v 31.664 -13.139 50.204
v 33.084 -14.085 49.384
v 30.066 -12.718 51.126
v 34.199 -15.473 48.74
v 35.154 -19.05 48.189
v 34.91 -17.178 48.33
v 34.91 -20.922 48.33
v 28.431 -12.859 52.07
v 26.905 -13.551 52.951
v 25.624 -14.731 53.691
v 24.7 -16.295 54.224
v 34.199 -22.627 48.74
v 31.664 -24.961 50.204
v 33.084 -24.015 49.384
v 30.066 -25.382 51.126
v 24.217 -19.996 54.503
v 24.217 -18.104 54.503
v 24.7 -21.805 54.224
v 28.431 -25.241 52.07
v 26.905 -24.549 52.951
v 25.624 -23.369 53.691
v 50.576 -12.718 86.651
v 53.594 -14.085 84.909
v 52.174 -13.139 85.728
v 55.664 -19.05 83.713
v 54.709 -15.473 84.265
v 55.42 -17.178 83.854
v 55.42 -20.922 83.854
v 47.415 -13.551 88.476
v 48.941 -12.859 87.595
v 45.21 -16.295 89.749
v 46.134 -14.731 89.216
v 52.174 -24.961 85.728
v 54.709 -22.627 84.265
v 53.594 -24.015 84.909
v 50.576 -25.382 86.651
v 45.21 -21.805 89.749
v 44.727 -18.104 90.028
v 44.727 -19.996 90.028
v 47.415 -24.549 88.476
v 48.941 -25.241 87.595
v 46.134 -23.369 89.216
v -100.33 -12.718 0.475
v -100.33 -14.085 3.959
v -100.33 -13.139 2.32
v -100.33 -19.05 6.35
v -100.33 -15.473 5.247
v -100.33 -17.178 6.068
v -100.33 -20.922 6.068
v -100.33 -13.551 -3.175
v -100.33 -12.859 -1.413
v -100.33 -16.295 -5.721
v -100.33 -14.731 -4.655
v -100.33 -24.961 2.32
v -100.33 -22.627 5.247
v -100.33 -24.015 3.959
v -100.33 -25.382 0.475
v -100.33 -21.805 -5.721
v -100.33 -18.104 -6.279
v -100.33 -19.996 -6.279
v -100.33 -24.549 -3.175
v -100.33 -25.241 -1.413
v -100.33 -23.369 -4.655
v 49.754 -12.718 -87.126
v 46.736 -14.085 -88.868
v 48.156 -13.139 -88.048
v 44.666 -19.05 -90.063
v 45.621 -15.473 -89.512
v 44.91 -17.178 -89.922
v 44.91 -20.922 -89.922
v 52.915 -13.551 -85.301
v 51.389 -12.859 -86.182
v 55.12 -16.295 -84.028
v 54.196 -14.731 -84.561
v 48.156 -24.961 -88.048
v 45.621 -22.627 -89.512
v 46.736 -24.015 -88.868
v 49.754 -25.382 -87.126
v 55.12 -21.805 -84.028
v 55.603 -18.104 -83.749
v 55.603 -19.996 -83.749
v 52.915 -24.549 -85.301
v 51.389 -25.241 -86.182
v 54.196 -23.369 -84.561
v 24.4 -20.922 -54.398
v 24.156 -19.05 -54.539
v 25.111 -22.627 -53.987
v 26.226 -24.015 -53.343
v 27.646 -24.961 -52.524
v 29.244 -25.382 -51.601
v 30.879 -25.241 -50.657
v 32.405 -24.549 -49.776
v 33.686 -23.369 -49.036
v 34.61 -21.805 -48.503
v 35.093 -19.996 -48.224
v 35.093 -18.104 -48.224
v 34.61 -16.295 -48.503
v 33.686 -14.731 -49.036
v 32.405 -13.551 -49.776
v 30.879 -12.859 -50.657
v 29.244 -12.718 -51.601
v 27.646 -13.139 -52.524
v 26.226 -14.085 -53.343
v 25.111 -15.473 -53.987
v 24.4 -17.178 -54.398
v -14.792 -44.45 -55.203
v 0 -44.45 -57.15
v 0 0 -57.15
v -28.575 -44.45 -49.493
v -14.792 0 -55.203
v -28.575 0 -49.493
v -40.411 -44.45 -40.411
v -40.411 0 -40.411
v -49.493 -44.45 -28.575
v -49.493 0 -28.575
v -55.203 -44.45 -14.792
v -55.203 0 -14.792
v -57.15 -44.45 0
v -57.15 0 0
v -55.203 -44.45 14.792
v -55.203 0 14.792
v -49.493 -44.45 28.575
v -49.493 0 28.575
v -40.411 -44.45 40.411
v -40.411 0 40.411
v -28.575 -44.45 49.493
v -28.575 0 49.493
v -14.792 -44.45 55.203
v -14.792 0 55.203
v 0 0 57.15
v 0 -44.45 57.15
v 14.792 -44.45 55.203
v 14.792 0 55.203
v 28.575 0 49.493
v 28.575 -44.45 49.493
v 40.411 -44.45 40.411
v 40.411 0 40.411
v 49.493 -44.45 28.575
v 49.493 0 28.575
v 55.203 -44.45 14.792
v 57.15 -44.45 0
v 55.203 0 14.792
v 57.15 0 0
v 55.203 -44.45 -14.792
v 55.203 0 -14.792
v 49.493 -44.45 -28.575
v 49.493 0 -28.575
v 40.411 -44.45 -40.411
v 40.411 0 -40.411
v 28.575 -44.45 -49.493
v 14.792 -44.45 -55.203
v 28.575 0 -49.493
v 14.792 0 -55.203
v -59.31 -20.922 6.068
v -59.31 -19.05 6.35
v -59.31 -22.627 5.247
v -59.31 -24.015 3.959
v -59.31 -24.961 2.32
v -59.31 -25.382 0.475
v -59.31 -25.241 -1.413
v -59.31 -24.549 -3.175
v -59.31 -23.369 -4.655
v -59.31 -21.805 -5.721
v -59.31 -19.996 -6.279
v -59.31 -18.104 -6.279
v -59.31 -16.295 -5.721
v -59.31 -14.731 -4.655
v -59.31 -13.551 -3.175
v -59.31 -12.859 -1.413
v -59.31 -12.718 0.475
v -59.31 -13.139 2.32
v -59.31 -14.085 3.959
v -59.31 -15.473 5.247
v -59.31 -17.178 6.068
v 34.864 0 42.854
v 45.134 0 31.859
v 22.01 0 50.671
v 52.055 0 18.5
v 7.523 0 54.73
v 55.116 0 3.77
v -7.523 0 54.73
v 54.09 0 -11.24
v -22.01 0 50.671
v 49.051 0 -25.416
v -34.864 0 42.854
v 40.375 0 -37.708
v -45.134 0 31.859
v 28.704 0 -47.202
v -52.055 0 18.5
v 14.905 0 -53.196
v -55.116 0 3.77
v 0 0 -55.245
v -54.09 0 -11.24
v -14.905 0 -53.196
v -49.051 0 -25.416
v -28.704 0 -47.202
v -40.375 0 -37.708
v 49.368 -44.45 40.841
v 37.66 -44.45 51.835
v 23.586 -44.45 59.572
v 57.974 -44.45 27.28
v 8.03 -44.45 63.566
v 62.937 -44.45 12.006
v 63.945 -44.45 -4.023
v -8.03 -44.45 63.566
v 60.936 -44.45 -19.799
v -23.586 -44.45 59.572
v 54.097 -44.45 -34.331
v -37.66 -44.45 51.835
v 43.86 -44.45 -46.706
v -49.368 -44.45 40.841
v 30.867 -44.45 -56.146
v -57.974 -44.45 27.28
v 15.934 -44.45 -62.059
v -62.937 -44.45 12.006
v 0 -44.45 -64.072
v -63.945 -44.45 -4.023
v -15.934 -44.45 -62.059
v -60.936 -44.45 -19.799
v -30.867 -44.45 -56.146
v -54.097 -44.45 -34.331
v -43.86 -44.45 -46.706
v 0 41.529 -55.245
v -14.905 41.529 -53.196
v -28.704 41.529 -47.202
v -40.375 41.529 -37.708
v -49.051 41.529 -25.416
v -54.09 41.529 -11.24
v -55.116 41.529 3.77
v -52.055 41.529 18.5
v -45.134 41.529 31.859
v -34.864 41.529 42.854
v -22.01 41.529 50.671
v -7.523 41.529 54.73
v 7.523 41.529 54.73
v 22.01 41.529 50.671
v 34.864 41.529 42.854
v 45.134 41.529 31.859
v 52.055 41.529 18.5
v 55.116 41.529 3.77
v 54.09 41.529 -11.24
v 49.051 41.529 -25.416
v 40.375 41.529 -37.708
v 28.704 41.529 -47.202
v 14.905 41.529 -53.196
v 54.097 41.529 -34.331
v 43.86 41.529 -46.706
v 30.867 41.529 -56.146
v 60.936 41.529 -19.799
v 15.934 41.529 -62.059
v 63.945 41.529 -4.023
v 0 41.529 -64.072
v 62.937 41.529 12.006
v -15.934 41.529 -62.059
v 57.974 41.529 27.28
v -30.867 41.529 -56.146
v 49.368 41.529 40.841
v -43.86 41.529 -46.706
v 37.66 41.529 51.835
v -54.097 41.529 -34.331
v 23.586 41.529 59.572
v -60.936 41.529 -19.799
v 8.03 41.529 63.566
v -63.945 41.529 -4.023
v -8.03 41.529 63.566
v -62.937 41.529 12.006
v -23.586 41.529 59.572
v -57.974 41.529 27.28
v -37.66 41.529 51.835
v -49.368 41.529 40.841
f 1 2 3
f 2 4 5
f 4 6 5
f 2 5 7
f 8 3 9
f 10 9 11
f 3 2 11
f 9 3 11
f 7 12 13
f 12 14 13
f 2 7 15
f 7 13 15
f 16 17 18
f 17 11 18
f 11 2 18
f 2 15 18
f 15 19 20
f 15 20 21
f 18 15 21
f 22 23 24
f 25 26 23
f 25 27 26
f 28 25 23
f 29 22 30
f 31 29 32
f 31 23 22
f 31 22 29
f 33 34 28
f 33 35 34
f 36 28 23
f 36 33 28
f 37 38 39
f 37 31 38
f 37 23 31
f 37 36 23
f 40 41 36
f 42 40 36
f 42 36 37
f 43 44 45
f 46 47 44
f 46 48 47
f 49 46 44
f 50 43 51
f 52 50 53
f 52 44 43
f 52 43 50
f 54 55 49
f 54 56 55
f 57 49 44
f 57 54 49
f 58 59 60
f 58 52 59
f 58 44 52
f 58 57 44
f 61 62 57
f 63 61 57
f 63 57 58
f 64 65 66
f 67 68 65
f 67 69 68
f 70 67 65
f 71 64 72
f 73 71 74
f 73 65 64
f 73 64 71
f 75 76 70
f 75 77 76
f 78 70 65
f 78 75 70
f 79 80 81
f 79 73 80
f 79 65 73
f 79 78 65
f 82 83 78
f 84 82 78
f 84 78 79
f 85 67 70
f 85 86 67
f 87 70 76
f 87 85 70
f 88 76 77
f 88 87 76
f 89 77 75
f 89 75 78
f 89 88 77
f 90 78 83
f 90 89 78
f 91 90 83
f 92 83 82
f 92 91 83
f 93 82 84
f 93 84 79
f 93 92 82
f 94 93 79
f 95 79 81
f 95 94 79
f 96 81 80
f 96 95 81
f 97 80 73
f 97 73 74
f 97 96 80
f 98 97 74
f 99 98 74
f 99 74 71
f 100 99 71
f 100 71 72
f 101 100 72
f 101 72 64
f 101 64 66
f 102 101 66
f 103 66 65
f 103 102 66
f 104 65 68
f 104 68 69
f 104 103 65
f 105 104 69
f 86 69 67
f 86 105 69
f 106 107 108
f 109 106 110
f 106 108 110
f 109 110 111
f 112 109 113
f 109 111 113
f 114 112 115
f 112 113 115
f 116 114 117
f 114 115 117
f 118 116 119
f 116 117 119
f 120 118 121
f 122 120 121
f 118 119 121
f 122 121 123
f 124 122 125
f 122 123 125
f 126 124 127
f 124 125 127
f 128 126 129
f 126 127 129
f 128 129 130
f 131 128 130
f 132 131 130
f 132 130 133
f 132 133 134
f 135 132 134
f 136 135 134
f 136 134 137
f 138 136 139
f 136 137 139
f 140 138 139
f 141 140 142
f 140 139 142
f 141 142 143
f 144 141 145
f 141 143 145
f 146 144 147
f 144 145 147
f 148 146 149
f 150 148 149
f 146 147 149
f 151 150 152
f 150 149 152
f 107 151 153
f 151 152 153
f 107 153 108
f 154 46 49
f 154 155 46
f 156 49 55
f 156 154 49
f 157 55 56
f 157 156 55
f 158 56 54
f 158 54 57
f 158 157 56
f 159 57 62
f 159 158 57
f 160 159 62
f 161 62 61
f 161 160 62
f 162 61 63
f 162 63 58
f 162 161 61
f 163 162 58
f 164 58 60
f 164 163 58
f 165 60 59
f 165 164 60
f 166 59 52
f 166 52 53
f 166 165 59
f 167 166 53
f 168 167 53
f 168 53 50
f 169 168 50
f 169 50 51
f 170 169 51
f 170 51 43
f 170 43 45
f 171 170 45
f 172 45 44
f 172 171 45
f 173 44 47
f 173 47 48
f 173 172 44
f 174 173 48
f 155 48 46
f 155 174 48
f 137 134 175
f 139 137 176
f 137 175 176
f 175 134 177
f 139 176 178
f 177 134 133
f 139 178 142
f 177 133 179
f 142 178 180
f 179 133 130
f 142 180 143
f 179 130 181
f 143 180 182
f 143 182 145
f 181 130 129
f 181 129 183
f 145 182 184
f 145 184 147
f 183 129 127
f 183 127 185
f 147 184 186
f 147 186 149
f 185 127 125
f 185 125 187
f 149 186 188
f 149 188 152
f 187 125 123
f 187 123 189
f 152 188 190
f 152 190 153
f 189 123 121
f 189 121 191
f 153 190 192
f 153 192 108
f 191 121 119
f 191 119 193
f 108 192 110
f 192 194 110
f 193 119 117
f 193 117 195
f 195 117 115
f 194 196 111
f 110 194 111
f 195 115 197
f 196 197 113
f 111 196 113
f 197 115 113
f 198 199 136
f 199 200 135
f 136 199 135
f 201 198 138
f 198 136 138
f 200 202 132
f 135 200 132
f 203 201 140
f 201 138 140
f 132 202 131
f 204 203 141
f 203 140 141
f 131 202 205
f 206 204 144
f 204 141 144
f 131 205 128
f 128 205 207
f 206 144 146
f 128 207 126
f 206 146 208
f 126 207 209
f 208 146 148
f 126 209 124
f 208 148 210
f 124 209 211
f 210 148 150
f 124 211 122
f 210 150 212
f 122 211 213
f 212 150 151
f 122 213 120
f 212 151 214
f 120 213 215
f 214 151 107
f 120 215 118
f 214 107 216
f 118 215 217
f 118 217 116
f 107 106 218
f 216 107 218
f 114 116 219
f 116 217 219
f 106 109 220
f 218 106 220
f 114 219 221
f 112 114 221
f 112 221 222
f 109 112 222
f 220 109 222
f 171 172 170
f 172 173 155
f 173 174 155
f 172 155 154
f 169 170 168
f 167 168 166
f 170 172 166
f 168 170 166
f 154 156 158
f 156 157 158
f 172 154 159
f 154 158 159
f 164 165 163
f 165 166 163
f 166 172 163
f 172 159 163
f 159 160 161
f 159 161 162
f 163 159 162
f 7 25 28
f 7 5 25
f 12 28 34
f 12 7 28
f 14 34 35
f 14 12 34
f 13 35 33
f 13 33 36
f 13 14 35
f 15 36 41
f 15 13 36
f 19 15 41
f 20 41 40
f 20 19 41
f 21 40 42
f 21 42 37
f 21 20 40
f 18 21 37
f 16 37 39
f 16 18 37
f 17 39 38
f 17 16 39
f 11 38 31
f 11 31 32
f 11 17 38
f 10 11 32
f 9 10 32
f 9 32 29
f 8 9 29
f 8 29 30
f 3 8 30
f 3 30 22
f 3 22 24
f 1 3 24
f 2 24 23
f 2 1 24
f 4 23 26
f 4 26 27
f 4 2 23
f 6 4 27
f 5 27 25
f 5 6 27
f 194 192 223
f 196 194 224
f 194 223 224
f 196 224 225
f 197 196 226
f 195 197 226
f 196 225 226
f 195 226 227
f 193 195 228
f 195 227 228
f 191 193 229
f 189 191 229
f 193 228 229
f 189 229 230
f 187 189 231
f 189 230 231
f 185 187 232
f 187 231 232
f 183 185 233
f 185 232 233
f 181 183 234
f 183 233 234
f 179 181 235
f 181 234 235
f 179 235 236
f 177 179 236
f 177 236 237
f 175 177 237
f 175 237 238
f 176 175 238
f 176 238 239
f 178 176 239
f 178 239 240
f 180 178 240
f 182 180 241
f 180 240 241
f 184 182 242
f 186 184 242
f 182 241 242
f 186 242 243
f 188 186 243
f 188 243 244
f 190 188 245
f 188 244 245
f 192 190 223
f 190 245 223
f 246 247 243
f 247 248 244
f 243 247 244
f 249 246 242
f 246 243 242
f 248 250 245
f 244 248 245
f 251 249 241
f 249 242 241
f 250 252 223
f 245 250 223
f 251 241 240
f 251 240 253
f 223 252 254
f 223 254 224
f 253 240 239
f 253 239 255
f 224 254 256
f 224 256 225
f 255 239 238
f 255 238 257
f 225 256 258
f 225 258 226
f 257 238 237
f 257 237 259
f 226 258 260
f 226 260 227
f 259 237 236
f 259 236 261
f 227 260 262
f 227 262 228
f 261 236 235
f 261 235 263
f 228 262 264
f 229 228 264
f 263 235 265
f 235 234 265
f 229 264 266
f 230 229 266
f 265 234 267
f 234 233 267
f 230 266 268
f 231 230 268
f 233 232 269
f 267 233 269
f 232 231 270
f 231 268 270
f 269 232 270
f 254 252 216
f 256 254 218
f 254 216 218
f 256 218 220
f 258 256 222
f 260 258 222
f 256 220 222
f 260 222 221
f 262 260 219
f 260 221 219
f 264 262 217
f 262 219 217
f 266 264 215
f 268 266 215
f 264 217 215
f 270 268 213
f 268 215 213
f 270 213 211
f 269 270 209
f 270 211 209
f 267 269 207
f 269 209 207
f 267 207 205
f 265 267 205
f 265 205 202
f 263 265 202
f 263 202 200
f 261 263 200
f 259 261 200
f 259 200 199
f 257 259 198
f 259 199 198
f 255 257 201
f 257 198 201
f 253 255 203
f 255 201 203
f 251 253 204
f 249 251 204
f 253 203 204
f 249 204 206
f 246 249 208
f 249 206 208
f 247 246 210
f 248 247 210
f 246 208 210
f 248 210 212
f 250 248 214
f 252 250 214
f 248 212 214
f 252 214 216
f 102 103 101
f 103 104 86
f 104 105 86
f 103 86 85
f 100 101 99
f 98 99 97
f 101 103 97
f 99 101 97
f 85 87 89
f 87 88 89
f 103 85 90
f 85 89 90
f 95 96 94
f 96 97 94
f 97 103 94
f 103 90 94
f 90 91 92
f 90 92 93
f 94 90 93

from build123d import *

# Parameters (mm, degrees)
SKETCH2_W         = 41.020252489
SKETCH2_H         = 6.35
CIRPATTERN1_COUNT = 3


with BuildPart() as part:
    # Sketch1 → Revolve1 (revolve)
    with BuildSketch(Plane.XY):
        Polygon((57.15, -44.45), (57.15, 0), (55.245, 0), (55.245, 41.529), (64.0715, 41.529), (64.0715, -44.45), align=None)
    revolve(axis=Axis((0, -1015.258156135, 0), (0, 1, 0)))


with BuildPart() as body_2:
    # Sketch2 → Revolve2 (revolve)
    with BuildSketch(Plane.XY):
        with Locations((-79.819873756, -15.875)):
            Rectangle(SKETCH2_W, SKETCH2_H)
    revolve(axis=Axis((-1132.04536123, -19.05, 0), (1, 0, 0)))


with BuildPart() as cirpattern1_1:
    # CirPattern1: pattern copy
    add(body_2.part.rotate(Axis((0, 45.82795, 0), (0, -1, 0)), 1 * 360 / CIRPATTERN1_COUNT))


with BuildPart() as cirpattern1_2:
    # CirPattern1: pattern copy
    add(body_2.part.rotate(Axis((0, 45.82795, 0), (0, -1, 0)), 2 * 360 / CIRPATTERN1_COUNT))


solid = Compound([part.part, body_2.part, cirpattern1_1.part, cirpattern1_2.part])
